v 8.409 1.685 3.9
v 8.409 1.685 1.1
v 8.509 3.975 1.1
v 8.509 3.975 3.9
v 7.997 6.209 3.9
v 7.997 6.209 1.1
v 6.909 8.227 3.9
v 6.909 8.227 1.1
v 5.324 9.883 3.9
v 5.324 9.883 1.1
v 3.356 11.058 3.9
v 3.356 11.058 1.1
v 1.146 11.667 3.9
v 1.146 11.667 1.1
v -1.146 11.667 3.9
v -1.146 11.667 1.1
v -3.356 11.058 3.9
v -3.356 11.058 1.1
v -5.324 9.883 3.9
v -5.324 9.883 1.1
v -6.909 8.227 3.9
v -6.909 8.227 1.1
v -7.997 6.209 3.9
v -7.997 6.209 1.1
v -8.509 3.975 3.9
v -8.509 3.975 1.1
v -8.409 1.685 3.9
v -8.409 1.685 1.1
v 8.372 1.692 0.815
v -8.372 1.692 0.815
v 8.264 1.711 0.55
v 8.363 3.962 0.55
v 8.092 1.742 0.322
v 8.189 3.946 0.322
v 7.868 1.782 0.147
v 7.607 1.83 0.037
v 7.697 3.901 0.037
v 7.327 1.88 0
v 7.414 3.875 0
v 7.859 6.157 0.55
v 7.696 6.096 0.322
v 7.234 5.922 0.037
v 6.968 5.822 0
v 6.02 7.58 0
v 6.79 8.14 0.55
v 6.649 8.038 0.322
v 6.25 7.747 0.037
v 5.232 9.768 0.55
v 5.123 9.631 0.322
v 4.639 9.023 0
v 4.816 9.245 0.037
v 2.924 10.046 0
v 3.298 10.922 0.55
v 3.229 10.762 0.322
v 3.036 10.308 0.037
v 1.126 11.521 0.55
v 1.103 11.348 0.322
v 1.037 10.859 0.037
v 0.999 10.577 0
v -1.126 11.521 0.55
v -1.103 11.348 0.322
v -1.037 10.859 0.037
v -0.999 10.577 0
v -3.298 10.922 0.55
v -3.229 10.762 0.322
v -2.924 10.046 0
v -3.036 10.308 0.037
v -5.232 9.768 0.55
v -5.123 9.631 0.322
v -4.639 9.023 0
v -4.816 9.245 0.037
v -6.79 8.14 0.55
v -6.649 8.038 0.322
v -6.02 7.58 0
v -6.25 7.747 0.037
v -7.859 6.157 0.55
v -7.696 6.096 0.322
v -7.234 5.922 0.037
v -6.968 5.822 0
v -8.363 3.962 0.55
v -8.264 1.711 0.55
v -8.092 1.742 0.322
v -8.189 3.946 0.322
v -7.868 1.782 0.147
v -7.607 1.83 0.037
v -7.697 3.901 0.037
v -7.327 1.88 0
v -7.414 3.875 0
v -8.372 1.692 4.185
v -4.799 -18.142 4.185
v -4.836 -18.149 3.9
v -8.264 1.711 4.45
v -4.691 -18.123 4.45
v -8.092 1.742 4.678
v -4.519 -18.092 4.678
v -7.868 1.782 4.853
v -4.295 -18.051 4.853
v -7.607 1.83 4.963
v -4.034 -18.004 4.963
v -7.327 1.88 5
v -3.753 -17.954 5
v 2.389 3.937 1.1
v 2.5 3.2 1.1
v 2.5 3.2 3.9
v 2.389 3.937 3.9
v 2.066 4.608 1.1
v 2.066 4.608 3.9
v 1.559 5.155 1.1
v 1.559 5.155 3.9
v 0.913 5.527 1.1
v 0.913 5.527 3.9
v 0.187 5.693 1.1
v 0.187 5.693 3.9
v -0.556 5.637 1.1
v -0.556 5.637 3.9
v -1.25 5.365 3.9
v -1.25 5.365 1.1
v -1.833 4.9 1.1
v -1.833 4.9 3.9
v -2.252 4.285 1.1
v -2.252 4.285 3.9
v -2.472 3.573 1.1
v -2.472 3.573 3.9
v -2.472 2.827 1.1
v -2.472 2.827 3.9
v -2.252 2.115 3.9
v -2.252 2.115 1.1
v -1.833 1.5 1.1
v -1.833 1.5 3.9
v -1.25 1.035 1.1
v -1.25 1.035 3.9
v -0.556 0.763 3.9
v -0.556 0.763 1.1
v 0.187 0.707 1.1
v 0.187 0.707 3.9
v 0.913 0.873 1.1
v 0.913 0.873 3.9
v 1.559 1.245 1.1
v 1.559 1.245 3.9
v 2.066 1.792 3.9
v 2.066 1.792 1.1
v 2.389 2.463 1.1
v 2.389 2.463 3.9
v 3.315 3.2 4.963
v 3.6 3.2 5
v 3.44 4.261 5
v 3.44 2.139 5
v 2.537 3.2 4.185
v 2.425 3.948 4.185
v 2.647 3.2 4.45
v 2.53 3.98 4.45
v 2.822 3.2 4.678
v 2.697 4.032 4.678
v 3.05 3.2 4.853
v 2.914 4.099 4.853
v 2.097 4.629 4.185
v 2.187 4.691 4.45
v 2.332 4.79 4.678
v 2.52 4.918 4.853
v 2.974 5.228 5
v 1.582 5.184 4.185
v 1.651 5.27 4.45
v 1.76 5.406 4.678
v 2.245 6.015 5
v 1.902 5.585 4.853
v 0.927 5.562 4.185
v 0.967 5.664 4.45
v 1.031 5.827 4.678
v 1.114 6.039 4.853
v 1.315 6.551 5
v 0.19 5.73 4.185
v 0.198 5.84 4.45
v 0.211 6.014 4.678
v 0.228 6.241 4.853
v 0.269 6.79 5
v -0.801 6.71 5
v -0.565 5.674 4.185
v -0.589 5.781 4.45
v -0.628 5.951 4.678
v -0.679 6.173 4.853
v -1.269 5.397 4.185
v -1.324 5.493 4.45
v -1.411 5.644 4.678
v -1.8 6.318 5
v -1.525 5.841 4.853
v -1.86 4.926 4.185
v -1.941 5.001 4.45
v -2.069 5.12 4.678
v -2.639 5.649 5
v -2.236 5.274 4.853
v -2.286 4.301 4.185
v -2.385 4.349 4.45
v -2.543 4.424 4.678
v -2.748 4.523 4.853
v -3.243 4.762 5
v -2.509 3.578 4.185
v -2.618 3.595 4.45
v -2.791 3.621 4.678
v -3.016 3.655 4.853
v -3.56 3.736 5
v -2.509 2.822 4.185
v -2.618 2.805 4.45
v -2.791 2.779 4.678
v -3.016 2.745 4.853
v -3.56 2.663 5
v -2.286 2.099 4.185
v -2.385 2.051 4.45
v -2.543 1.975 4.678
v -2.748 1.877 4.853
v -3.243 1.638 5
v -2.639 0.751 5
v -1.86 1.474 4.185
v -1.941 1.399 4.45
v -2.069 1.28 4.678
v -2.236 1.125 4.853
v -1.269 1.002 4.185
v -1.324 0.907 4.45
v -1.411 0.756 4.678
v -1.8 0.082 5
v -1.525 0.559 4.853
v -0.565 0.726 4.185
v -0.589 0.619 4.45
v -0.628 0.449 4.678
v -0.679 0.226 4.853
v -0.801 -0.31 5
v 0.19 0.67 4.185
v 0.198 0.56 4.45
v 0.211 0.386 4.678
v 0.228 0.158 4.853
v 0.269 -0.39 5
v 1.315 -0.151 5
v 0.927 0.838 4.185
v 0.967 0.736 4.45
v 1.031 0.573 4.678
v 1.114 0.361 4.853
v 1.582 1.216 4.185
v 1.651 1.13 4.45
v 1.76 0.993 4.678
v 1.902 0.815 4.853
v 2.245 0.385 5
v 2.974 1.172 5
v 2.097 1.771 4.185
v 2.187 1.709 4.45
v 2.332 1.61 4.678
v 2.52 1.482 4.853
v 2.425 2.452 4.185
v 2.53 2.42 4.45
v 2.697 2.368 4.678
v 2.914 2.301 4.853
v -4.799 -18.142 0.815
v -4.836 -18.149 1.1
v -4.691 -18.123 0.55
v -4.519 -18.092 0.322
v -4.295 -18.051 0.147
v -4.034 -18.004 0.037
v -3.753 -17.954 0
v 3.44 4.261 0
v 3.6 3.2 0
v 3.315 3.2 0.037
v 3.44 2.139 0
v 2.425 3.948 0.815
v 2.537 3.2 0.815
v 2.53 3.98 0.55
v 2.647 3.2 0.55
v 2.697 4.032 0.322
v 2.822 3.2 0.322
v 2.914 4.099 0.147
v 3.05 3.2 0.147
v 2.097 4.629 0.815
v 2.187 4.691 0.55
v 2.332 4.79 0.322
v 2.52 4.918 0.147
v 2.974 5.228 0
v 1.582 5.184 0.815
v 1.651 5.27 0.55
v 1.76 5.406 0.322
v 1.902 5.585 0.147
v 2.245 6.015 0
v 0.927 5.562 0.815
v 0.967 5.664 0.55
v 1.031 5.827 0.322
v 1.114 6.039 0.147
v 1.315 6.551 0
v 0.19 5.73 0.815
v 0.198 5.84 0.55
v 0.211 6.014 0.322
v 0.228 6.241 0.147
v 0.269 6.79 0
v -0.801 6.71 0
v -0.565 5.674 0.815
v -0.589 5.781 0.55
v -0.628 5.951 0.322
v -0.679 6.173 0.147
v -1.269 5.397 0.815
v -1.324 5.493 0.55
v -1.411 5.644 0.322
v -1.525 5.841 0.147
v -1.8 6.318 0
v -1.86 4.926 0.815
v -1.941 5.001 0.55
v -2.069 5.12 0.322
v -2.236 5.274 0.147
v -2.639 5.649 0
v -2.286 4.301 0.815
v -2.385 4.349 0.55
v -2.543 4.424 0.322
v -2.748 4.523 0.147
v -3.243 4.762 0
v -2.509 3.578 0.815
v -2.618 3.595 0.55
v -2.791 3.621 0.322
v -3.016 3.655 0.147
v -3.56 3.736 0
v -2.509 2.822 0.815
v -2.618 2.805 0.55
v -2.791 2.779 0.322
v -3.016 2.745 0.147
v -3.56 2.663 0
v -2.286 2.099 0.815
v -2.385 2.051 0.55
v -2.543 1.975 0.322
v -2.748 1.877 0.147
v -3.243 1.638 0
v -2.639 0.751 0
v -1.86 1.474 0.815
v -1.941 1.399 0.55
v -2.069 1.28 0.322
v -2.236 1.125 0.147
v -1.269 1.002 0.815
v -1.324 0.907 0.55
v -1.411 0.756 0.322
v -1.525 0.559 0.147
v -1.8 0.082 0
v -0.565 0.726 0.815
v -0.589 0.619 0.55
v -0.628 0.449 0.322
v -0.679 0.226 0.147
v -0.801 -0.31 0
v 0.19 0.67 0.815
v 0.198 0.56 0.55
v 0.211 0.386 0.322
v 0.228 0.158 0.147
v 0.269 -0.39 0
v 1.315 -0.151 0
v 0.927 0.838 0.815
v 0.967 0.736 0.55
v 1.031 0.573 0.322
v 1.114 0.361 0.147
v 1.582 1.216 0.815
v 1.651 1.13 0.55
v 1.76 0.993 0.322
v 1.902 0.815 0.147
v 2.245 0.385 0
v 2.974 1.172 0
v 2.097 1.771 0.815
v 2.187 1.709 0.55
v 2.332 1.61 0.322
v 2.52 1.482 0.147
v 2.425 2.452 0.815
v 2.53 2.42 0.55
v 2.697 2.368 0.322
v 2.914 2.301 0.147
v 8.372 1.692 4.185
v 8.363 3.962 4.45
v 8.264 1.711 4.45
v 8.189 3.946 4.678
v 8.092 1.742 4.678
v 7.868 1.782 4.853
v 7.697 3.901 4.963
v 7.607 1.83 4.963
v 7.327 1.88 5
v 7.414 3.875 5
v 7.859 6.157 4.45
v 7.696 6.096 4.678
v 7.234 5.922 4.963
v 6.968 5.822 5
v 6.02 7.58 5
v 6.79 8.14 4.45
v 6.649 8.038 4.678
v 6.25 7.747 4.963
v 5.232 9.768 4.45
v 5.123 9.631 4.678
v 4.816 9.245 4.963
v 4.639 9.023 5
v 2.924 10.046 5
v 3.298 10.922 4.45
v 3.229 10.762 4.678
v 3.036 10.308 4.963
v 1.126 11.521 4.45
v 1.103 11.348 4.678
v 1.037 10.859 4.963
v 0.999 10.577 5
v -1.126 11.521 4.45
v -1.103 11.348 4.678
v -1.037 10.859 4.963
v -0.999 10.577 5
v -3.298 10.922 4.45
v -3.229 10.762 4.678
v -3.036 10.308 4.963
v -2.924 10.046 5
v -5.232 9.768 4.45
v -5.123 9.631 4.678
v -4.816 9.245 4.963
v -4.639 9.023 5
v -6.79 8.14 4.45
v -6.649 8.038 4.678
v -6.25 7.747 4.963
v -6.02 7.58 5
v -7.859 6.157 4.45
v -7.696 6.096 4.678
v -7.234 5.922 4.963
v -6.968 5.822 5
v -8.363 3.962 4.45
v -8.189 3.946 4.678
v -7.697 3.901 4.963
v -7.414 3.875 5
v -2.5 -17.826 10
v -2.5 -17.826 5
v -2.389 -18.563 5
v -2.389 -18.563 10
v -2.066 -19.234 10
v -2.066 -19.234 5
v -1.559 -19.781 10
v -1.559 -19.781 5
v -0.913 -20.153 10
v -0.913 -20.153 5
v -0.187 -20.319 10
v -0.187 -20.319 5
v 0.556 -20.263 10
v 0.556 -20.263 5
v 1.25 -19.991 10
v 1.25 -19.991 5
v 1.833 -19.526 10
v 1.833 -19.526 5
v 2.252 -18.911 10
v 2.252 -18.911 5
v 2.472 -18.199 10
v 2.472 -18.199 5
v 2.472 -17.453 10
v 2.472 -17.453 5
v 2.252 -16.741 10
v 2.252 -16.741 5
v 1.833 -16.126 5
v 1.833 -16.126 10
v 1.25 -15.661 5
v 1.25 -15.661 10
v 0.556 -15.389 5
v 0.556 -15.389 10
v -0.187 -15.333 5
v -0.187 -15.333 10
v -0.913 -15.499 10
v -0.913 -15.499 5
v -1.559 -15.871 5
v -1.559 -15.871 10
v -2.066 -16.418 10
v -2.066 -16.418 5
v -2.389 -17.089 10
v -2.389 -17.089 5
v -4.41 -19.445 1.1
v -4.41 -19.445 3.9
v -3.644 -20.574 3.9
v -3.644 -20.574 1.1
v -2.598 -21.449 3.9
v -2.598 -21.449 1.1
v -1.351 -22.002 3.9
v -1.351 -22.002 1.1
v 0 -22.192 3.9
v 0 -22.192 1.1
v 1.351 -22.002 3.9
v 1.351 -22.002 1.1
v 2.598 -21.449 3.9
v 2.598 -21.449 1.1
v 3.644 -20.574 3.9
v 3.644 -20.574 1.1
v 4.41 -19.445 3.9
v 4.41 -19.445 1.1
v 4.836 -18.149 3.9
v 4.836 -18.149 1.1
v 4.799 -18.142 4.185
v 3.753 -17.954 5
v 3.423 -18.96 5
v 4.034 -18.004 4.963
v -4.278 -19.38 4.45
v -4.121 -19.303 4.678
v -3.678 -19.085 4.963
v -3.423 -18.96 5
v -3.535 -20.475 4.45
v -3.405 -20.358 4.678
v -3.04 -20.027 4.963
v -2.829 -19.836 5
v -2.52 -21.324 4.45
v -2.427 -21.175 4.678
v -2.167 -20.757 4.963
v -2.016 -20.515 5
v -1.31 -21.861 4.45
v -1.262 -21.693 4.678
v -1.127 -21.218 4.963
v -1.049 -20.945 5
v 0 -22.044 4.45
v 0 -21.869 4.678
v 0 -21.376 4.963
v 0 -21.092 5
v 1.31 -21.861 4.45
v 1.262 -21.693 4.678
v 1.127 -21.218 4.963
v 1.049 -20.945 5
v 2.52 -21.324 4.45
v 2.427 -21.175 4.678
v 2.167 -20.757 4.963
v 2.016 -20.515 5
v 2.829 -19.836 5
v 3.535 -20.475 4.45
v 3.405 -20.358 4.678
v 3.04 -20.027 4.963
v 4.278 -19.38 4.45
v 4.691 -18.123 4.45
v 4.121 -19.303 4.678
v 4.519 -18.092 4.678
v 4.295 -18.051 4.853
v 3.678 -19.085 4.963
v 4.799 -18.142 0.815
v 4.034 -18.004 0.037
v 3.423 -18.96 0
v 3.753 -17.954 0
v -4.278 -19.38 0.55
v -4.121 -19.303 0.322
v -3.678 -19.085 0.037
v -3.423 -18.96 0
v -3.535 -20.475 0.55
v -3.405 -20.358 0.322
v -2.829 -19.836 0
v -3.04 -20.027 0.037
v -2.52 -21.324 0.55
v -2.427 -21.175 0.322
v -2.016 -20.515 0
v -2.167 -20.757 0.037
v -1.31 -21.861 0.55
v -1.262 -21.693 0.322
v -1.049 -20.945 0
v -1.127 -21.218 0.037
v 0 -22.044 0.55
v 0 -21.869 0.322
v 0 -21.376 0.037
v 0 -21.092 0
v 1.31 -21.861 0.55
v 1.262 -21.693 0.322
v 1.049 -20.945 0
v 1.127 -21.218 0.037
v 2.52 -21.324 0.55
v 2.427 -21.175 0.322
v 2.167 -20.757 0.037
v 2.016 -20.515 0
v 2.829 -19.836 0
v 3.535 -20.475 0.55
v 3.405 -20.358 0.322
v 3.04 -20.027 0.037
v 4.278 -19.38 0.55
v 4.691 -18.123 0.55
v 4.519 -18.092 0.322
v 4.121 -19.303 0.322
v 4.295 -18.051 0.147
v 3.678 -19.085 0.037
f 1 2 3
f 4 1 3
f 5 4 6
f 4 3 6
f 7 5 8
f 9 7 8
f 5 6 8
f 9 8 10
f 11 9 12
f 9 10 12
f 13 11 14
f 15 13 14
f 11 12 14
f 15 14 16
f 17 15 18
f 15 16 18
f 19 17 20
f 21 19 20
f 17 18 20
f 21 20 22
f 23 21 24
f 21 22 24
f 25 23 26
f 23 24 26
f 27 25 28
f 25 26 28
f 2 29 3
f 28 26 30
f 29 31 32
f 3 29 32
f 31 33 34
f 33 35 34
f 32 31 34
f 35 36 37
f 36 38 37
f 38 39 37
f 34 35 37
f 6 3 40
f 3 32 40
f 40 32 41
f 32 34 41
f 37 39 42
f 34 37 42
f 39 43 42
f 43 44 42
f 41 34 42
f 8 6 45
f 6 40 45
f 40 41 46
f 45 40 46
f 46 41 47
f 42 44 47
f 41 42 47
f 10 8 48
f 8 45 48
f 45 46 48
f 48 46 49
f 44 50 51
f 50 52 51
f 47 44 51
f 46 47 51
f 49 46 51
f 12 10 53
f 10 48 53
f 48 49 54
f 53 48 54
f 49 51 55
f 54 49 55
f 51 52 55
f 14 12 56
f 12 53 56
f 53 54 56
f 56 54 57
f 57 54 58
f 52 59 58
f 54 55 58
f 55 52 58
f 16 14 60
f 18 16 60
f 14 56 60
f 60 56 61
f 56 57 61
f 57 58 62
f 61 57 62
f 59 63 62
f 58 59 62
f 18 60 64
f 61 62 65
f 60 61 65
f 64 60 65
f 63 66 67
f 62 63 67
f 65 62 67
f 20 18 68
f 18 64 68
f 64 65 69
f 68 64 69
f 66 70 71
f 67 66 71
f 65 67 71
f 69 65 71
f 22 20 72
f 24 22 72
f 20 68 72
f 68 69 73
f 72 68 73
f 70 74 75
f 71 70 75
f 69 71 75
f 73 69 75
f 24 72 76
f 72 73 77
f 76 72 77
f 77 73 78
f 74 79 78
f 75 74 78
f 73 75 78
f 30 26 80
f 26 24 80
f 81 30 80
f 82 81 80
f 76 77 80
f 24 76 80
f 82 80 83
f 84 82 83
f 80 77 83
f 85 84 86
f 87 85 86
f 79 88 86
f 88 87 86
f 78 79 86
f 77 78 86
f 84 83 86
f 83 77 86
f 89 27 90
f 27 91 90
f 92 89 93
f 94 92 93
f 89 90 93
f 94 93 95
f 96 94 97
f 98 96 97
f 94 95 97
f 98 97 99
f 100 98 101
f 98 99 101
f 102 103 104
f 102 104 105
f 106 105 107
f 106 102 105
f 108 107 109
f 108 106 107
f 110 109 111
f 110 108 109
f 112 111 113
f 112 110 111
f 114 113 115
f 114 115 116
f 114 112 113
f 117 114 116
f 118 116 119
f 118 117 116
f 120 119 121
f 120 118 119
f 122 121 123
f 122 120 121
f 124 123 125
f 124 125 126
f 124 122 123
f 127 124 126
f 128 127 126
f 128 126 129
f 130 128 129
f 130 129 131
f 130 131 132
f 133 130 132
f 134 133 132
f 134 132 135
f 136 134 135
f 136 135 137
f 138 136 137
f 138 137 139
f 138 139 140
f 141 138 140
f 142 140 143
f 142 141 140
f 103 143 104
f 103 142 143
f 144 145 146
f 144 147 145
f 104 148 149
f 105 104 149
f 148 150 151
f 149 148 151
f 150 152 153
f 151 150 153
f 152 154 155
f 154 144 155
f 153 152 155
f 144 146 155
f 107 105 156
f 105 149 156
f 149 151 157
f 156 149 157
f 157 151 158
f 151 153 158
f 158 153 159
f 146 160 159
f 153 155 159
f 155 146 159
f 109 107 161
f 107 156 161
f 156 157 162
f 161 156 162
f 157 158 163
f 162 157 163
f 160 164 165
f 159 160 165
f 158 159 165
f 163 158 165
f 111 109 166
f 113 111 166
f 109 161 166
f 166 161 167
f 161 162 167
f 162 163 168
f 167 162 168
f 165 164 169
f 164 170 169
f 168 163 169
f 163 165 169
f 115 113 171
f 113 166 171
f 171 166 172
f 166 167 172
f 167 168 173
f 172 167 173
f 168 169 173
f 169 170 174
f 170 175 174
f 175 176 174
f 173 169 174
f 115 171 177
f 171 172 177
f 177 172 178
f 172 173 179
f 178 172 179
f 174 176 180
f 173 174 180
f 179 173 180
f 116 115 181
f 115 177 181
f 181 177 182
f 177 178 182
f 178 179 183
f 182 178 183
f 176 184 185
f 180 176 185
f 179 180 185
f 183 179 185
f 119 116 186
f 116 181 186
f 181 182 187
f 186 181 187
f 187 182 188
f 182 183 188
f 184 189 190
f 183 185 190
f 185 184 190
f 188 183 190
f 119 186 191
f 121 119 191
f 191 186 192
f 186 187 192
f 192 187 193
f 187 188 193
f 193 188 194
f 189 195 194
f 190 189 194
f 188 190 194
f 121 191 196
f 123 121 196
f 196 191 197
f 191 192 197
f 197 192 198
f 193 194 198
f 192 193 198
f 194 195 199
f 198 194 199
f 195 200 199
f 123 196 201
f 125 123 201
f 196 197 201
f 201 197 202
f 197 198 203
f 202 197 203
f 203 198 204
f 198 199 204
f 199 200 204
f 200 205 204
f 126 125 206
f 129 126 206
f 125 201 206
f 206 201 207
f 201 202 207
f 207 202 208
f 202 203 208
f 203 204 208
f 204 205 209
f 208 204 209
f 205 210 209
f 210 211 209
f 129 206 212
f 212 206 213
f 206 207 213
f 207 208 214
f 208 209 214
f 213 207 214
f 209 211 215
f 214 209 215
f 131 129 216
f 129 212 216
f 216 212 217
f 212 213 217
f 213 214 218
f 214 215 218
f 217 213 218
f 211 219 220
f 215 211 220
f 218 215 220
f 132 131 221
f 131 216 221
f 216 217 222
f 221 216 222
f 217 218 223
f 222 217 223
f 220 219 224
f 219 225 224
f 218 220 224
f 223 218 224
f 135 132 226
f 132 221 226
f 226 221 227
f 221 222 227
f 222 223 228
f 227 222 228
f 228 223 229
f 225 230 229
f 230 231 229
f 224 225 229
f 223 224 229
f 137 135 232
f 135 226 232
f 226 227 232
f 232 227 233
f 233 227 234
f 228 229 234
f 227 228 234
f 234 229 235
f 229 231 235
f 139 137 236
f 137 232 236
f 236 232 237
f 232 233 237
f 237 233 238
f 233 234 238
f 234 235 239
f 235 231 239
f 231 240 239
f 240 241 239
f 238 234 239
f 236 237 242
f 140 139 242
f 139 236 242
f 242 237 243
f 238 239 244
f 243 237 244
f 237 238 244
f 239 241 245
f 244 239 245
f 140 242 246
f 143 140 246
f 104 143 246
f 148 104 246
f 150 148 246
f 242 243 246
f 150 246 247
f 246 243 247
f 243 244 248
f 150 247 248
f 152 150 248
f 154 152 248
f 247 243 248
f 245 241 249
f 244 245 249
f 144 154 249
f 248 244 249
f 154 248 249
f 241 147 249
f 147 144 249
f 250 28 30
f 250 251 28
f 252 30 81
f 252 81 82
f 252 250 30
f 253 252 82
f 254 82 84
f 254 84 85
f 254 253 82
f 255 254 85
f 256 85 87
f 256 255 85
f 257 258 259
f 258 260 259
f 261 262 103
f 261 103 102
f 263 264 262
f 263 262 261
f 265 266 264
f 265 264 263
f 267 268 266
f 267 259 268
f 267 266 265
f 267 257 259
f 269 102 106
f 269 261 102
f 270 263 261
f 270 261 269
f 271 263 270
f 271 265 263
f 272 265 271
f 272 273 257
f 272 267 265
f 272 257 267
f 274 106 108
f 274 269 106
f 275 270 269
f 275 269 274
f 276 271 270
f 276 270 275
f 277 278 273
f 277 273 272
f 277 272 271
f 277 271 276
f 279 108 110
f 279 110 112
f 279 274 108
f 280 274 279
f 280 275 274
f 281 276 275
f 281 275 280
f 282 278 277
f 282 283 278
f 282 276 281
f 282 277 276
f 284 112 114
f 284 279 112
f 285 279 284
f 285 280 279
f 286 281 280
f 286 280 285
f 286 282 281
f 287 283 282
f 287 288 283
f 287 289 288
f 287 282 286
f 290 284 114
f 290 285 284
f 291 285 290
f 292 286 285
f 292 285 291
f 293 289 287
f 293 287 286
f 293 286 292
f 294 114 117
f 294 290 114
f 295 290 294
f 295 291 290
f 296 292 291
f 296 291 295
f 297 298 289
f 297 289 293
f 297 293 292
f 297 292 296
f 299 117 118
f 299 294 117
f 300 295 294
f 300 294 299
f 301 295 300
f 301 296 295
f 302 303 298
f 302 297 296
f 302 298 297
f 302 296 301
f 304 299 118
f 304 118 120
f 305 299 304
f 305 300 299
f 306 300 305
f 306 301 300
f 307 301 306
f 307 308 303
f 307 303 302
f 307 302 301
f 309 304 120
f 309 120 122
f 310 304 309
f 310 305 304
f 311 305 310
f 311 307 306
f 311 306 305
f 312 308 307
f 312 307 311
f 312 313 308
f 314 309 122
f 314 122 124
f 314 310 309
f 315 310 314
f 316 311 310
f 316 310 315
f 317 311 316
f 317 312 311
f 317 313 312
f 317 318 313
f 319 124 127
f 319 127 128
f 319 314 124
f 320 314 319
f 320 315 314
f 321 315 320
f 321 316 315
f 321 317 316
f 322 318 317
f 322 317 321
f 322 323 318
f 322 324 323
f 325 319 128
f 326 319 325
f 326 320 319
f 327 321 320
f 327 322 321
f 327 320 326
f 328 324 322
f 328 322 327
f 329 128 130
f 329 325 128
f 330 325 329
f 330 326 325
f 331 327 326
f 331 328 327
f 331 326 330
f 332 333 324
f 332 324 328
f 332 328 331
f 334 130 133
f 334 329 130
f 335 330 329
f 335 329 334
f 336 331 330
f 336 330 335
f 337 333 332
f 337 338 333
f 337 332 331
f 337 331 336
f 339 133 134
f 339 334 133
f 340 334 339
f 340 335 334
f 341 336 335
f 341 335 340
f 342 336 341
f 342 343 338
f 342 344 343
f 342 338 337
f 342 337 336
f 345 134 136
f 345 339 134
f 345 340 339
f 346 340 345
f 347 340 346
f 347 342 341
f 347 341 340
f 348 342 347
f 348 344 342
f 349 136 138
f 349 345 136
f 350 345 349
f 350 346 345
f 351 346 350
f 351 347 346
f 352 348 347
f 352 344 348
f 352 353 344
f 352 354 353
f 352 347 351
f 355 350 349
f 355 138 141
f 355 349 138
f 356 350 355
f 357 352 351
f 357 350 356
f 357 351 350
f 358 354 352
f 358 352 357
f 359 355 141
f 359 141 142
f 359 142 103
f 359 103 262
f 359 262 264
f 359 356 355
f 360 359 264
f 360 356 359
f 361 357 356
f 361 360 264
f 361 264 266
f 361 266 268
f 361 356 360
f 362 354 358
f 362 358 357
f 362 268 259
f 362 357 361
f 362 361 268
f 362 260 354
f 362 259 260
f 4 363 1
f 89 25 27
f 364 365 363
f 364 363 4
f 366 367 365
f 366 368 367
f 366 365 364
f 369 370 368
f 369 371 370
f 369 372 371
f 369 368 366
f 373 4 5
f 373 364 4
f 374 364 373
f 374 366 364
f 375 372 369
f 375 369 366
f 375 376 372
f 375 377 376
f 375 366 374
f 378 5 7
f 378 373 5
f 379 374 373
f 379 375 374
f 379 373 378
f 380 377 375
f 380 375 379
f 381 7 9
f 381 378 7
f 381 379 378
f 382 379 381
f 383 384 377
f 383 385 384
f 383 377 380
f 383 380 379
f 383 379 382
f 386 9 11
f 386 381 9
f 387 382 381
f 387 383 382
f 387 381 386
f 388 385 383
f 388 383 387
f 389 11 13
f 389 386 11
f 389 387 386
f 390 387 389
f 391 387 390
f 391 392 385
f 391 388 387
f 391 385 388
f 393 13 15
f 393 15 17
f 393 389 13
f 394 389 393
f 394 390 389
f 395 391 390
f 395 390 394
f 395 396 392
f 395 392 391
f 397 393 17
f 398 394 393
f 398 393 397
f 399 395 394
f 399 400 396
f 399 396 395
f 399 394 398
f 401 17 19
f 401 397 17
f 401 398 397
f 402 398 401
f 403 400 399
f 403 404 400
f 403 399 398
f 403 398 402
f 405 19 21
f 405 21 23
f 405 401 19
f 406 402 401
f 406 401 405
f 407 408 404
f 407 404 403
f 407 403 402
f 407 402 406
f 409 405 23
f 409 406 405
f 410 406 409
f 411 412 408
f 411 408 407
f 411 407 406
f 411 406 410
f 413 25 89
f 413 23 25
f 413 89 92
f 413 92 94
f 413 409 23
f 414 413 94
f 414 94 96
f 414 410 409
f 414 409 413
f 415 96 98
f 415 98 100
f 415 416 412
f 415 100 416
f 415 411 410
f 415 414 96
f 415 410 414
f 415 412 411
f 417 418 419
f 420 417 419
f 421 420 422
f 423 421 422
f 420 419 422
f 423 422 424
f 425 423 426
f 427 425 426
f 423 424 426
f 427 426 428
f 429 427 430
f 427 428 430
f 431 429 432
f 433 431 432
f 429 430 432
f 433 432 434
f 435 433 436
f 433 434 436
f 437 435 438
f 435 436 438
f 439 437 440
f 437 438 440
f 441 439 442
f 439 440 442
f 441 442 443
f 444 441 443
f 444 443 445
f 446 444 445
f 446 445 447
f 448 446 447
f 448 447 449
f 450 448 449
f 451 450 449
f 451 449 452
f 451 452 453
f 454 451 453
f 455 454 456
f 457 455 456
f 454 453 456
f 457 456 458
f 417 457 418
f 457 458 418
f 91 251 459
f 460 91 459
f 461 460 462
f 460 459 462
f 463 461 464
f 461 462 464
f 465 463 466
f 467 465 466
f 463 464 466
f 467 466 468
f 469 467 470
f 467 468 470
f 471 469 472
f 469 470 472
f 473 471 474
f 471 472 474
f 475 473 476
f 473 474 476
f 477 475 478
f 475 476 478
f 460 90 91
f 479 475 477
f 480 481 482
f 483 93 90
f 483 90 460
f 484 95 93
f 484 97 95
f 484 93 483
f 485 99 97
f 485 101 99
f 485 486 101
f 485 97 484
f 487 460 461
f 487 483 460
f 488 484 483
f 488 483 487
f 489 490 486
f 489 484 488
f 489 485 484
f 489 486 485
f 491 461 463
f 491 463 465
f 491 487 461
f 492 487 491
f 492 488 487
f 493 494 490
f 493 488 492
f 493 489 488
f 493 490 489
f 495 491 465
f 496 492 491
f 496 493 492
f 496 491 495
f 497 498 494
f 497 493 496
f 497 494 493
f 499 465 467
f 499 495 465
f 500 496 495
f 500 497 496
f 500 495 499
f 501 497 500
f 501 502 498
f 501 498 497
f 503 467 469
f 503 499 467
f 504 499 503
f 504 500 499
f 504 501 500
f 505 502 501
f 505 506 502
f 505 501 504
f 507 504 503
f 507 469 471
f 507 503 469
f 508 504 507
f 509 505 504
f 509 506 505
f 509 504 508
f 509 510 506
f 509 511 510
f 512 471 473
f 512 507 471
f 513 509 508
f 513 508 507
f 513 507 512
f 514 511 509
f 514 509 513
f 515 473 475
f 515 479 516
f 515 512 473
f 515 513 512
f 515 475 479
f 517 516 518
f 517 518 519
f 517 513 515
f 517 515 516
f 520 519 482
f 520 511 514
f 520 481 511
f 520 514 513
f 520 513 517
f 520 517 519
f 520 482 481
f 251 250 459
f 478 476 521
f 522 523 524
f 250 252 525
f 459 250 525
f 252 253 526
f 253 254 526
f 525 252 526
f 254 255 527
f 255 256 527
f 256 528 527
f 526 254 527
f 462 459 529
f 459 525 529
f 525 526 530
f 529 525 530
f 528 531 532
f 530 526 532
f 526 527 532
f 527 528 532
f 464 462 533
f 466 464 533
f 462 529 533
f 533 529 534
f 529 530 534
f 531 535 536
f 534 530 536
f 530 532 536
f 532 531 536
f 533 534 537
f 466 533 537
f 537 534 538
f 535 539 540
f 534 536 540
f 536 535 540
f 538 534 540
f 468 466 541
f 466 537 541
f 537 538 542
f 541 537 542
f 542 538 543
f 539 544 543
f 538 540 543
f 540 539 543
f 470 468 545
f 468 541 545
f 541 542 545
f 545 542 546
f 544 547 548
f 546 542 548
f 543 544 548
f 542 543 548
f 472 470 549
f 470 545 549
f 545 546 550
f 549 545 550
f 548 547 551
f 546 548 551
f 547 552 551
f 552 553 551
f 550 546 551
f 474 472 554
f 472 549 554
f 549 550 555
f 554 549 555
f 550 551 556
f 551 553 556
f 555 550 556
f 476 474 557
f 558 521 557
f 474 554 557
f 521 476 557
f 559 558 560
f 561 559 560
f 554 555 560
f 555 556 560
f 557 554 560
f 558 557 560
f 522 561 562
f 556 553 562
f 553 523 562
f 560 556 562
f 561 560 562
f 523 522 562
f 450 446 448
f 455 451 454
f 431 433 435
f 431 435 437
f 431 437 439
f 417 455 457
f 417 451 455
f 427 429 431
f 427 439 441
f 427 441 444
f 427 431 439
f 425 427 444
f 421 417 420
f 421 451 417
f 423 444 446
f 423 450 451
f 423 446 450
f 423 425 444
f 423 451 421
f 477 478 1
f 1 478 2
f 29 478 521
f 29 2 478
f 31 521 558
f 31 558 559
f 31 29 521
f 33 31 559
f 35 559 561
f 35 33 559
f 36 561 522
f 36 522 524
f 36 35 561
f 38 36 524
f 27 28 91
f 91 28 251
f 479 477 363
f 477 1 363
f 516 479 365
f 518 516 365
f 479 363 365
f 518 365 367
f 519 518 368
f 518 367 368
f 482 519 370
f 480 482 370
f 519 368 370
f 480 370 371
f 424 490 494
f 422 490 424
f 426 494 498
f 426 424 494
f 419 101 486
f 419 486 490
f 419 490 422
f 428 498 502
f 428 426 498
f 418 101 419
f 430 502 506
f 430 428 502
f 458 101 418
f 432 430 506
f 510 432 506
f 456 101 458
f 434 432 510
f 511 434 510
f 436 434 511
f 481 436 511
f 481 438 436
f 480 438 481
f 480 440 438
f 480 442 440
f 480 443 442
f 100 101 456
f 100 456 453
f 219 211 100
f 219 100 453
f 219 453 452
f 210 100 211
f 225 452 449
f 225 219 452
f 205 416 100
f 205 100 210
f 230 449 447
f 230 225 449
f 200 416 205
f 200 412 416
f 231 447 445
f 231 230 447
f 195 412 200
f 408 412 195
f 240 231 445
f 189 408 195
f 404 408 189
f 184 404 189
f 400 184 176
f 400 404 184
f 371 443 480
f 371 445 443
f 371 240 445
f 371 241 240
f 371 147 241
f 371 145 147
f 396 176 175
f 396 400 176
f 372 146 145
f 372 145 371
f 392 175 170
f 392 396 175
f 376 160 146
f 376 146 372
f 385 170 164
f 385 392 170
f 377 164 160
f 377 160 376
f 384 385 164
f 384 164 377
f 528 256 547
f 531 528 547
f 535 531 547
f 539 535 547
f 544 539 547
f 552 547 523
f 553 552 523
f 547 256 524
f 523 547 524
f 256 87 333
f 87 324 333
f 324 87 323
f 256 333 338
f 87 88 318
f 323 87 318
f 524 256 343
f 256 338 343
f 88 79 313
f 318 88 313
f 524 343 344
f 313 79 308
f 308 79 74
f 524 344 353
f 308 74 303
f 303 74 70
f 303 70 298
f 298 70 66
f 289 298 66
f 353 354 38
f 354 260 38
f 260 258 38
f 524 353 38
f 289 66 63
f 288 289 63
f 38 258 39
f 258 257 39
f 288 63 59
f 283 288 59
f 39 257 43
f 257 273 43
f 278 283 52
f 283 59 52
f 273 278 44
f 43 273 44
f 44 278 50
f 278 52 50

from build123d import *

# Parameters (mm, degrees)
SKETCH2_R           = 2.5
BOSS_EXTRUDE1_DEPTH = 5
FILLET1_R           = 1.1
SKETCH5_R           = 2.5
BOSS_EXTRUDE2_DEPTH = 5


with BuildPart() as part:
    # Sketch2 → Boss-Extrude1 (new body)
    with BuildSketch(Plane.XY):
        with BuildLine():
            Line((-8.409252233, 1.684959921), (-4.836047922, -18.148987446))
            ThreePointArc((-4.836047922, -18.148987446), (0, -22.191645553), (4.836047922, -18.148987446))
            Line((4.836047922, -18.148987446), (8.409252233, 1.684959921))
            ThreePointArc((8.409252233, 1.684959921), (0, 11.744565684), (-8.409252233, 1.684959921))
        make_face()
        with Locations((0, 3.199937034)):
            Circle(SKETCH2_R, mode=Mode.SUBTRACT)
    extrude(amount=BOSS_EXTRUDE1_DEPTH)

    # Fillet1
    fillet1_edges = [part.edges().sort_by_distance(p)[0] for p in [
        (0, -22.191645553, 5),
        (-2.5, 3.199937034, 0),
        (-2.5, 3.199937034, 5),
        (6.622650078, -8.232013763, 5),
        (0, 11.744565684, 5),
        (6.622650078, -8.232013763, 0),
        (0, -22.191645553, 0),
        (-6.622650078, -8.232013763, 0),
        (0, 11.744565684, 0),
        (-6.622650078, -8.232013763, 5),
    ]]
    fillet(fillet1_edges, radius=FILLET1_R)

    # Sketch5 → Boss-Extrude2 (add)
    with BuildSketch(Plane.XY.offset(5)):
        with Locations(Location((0, -17.825950176, 0), (0, 0, 180))):
            Circle(SKETCH5_R)
    extrude(amount=BOSS_EXTRUDE2_DEPTH)


solid = part.part
